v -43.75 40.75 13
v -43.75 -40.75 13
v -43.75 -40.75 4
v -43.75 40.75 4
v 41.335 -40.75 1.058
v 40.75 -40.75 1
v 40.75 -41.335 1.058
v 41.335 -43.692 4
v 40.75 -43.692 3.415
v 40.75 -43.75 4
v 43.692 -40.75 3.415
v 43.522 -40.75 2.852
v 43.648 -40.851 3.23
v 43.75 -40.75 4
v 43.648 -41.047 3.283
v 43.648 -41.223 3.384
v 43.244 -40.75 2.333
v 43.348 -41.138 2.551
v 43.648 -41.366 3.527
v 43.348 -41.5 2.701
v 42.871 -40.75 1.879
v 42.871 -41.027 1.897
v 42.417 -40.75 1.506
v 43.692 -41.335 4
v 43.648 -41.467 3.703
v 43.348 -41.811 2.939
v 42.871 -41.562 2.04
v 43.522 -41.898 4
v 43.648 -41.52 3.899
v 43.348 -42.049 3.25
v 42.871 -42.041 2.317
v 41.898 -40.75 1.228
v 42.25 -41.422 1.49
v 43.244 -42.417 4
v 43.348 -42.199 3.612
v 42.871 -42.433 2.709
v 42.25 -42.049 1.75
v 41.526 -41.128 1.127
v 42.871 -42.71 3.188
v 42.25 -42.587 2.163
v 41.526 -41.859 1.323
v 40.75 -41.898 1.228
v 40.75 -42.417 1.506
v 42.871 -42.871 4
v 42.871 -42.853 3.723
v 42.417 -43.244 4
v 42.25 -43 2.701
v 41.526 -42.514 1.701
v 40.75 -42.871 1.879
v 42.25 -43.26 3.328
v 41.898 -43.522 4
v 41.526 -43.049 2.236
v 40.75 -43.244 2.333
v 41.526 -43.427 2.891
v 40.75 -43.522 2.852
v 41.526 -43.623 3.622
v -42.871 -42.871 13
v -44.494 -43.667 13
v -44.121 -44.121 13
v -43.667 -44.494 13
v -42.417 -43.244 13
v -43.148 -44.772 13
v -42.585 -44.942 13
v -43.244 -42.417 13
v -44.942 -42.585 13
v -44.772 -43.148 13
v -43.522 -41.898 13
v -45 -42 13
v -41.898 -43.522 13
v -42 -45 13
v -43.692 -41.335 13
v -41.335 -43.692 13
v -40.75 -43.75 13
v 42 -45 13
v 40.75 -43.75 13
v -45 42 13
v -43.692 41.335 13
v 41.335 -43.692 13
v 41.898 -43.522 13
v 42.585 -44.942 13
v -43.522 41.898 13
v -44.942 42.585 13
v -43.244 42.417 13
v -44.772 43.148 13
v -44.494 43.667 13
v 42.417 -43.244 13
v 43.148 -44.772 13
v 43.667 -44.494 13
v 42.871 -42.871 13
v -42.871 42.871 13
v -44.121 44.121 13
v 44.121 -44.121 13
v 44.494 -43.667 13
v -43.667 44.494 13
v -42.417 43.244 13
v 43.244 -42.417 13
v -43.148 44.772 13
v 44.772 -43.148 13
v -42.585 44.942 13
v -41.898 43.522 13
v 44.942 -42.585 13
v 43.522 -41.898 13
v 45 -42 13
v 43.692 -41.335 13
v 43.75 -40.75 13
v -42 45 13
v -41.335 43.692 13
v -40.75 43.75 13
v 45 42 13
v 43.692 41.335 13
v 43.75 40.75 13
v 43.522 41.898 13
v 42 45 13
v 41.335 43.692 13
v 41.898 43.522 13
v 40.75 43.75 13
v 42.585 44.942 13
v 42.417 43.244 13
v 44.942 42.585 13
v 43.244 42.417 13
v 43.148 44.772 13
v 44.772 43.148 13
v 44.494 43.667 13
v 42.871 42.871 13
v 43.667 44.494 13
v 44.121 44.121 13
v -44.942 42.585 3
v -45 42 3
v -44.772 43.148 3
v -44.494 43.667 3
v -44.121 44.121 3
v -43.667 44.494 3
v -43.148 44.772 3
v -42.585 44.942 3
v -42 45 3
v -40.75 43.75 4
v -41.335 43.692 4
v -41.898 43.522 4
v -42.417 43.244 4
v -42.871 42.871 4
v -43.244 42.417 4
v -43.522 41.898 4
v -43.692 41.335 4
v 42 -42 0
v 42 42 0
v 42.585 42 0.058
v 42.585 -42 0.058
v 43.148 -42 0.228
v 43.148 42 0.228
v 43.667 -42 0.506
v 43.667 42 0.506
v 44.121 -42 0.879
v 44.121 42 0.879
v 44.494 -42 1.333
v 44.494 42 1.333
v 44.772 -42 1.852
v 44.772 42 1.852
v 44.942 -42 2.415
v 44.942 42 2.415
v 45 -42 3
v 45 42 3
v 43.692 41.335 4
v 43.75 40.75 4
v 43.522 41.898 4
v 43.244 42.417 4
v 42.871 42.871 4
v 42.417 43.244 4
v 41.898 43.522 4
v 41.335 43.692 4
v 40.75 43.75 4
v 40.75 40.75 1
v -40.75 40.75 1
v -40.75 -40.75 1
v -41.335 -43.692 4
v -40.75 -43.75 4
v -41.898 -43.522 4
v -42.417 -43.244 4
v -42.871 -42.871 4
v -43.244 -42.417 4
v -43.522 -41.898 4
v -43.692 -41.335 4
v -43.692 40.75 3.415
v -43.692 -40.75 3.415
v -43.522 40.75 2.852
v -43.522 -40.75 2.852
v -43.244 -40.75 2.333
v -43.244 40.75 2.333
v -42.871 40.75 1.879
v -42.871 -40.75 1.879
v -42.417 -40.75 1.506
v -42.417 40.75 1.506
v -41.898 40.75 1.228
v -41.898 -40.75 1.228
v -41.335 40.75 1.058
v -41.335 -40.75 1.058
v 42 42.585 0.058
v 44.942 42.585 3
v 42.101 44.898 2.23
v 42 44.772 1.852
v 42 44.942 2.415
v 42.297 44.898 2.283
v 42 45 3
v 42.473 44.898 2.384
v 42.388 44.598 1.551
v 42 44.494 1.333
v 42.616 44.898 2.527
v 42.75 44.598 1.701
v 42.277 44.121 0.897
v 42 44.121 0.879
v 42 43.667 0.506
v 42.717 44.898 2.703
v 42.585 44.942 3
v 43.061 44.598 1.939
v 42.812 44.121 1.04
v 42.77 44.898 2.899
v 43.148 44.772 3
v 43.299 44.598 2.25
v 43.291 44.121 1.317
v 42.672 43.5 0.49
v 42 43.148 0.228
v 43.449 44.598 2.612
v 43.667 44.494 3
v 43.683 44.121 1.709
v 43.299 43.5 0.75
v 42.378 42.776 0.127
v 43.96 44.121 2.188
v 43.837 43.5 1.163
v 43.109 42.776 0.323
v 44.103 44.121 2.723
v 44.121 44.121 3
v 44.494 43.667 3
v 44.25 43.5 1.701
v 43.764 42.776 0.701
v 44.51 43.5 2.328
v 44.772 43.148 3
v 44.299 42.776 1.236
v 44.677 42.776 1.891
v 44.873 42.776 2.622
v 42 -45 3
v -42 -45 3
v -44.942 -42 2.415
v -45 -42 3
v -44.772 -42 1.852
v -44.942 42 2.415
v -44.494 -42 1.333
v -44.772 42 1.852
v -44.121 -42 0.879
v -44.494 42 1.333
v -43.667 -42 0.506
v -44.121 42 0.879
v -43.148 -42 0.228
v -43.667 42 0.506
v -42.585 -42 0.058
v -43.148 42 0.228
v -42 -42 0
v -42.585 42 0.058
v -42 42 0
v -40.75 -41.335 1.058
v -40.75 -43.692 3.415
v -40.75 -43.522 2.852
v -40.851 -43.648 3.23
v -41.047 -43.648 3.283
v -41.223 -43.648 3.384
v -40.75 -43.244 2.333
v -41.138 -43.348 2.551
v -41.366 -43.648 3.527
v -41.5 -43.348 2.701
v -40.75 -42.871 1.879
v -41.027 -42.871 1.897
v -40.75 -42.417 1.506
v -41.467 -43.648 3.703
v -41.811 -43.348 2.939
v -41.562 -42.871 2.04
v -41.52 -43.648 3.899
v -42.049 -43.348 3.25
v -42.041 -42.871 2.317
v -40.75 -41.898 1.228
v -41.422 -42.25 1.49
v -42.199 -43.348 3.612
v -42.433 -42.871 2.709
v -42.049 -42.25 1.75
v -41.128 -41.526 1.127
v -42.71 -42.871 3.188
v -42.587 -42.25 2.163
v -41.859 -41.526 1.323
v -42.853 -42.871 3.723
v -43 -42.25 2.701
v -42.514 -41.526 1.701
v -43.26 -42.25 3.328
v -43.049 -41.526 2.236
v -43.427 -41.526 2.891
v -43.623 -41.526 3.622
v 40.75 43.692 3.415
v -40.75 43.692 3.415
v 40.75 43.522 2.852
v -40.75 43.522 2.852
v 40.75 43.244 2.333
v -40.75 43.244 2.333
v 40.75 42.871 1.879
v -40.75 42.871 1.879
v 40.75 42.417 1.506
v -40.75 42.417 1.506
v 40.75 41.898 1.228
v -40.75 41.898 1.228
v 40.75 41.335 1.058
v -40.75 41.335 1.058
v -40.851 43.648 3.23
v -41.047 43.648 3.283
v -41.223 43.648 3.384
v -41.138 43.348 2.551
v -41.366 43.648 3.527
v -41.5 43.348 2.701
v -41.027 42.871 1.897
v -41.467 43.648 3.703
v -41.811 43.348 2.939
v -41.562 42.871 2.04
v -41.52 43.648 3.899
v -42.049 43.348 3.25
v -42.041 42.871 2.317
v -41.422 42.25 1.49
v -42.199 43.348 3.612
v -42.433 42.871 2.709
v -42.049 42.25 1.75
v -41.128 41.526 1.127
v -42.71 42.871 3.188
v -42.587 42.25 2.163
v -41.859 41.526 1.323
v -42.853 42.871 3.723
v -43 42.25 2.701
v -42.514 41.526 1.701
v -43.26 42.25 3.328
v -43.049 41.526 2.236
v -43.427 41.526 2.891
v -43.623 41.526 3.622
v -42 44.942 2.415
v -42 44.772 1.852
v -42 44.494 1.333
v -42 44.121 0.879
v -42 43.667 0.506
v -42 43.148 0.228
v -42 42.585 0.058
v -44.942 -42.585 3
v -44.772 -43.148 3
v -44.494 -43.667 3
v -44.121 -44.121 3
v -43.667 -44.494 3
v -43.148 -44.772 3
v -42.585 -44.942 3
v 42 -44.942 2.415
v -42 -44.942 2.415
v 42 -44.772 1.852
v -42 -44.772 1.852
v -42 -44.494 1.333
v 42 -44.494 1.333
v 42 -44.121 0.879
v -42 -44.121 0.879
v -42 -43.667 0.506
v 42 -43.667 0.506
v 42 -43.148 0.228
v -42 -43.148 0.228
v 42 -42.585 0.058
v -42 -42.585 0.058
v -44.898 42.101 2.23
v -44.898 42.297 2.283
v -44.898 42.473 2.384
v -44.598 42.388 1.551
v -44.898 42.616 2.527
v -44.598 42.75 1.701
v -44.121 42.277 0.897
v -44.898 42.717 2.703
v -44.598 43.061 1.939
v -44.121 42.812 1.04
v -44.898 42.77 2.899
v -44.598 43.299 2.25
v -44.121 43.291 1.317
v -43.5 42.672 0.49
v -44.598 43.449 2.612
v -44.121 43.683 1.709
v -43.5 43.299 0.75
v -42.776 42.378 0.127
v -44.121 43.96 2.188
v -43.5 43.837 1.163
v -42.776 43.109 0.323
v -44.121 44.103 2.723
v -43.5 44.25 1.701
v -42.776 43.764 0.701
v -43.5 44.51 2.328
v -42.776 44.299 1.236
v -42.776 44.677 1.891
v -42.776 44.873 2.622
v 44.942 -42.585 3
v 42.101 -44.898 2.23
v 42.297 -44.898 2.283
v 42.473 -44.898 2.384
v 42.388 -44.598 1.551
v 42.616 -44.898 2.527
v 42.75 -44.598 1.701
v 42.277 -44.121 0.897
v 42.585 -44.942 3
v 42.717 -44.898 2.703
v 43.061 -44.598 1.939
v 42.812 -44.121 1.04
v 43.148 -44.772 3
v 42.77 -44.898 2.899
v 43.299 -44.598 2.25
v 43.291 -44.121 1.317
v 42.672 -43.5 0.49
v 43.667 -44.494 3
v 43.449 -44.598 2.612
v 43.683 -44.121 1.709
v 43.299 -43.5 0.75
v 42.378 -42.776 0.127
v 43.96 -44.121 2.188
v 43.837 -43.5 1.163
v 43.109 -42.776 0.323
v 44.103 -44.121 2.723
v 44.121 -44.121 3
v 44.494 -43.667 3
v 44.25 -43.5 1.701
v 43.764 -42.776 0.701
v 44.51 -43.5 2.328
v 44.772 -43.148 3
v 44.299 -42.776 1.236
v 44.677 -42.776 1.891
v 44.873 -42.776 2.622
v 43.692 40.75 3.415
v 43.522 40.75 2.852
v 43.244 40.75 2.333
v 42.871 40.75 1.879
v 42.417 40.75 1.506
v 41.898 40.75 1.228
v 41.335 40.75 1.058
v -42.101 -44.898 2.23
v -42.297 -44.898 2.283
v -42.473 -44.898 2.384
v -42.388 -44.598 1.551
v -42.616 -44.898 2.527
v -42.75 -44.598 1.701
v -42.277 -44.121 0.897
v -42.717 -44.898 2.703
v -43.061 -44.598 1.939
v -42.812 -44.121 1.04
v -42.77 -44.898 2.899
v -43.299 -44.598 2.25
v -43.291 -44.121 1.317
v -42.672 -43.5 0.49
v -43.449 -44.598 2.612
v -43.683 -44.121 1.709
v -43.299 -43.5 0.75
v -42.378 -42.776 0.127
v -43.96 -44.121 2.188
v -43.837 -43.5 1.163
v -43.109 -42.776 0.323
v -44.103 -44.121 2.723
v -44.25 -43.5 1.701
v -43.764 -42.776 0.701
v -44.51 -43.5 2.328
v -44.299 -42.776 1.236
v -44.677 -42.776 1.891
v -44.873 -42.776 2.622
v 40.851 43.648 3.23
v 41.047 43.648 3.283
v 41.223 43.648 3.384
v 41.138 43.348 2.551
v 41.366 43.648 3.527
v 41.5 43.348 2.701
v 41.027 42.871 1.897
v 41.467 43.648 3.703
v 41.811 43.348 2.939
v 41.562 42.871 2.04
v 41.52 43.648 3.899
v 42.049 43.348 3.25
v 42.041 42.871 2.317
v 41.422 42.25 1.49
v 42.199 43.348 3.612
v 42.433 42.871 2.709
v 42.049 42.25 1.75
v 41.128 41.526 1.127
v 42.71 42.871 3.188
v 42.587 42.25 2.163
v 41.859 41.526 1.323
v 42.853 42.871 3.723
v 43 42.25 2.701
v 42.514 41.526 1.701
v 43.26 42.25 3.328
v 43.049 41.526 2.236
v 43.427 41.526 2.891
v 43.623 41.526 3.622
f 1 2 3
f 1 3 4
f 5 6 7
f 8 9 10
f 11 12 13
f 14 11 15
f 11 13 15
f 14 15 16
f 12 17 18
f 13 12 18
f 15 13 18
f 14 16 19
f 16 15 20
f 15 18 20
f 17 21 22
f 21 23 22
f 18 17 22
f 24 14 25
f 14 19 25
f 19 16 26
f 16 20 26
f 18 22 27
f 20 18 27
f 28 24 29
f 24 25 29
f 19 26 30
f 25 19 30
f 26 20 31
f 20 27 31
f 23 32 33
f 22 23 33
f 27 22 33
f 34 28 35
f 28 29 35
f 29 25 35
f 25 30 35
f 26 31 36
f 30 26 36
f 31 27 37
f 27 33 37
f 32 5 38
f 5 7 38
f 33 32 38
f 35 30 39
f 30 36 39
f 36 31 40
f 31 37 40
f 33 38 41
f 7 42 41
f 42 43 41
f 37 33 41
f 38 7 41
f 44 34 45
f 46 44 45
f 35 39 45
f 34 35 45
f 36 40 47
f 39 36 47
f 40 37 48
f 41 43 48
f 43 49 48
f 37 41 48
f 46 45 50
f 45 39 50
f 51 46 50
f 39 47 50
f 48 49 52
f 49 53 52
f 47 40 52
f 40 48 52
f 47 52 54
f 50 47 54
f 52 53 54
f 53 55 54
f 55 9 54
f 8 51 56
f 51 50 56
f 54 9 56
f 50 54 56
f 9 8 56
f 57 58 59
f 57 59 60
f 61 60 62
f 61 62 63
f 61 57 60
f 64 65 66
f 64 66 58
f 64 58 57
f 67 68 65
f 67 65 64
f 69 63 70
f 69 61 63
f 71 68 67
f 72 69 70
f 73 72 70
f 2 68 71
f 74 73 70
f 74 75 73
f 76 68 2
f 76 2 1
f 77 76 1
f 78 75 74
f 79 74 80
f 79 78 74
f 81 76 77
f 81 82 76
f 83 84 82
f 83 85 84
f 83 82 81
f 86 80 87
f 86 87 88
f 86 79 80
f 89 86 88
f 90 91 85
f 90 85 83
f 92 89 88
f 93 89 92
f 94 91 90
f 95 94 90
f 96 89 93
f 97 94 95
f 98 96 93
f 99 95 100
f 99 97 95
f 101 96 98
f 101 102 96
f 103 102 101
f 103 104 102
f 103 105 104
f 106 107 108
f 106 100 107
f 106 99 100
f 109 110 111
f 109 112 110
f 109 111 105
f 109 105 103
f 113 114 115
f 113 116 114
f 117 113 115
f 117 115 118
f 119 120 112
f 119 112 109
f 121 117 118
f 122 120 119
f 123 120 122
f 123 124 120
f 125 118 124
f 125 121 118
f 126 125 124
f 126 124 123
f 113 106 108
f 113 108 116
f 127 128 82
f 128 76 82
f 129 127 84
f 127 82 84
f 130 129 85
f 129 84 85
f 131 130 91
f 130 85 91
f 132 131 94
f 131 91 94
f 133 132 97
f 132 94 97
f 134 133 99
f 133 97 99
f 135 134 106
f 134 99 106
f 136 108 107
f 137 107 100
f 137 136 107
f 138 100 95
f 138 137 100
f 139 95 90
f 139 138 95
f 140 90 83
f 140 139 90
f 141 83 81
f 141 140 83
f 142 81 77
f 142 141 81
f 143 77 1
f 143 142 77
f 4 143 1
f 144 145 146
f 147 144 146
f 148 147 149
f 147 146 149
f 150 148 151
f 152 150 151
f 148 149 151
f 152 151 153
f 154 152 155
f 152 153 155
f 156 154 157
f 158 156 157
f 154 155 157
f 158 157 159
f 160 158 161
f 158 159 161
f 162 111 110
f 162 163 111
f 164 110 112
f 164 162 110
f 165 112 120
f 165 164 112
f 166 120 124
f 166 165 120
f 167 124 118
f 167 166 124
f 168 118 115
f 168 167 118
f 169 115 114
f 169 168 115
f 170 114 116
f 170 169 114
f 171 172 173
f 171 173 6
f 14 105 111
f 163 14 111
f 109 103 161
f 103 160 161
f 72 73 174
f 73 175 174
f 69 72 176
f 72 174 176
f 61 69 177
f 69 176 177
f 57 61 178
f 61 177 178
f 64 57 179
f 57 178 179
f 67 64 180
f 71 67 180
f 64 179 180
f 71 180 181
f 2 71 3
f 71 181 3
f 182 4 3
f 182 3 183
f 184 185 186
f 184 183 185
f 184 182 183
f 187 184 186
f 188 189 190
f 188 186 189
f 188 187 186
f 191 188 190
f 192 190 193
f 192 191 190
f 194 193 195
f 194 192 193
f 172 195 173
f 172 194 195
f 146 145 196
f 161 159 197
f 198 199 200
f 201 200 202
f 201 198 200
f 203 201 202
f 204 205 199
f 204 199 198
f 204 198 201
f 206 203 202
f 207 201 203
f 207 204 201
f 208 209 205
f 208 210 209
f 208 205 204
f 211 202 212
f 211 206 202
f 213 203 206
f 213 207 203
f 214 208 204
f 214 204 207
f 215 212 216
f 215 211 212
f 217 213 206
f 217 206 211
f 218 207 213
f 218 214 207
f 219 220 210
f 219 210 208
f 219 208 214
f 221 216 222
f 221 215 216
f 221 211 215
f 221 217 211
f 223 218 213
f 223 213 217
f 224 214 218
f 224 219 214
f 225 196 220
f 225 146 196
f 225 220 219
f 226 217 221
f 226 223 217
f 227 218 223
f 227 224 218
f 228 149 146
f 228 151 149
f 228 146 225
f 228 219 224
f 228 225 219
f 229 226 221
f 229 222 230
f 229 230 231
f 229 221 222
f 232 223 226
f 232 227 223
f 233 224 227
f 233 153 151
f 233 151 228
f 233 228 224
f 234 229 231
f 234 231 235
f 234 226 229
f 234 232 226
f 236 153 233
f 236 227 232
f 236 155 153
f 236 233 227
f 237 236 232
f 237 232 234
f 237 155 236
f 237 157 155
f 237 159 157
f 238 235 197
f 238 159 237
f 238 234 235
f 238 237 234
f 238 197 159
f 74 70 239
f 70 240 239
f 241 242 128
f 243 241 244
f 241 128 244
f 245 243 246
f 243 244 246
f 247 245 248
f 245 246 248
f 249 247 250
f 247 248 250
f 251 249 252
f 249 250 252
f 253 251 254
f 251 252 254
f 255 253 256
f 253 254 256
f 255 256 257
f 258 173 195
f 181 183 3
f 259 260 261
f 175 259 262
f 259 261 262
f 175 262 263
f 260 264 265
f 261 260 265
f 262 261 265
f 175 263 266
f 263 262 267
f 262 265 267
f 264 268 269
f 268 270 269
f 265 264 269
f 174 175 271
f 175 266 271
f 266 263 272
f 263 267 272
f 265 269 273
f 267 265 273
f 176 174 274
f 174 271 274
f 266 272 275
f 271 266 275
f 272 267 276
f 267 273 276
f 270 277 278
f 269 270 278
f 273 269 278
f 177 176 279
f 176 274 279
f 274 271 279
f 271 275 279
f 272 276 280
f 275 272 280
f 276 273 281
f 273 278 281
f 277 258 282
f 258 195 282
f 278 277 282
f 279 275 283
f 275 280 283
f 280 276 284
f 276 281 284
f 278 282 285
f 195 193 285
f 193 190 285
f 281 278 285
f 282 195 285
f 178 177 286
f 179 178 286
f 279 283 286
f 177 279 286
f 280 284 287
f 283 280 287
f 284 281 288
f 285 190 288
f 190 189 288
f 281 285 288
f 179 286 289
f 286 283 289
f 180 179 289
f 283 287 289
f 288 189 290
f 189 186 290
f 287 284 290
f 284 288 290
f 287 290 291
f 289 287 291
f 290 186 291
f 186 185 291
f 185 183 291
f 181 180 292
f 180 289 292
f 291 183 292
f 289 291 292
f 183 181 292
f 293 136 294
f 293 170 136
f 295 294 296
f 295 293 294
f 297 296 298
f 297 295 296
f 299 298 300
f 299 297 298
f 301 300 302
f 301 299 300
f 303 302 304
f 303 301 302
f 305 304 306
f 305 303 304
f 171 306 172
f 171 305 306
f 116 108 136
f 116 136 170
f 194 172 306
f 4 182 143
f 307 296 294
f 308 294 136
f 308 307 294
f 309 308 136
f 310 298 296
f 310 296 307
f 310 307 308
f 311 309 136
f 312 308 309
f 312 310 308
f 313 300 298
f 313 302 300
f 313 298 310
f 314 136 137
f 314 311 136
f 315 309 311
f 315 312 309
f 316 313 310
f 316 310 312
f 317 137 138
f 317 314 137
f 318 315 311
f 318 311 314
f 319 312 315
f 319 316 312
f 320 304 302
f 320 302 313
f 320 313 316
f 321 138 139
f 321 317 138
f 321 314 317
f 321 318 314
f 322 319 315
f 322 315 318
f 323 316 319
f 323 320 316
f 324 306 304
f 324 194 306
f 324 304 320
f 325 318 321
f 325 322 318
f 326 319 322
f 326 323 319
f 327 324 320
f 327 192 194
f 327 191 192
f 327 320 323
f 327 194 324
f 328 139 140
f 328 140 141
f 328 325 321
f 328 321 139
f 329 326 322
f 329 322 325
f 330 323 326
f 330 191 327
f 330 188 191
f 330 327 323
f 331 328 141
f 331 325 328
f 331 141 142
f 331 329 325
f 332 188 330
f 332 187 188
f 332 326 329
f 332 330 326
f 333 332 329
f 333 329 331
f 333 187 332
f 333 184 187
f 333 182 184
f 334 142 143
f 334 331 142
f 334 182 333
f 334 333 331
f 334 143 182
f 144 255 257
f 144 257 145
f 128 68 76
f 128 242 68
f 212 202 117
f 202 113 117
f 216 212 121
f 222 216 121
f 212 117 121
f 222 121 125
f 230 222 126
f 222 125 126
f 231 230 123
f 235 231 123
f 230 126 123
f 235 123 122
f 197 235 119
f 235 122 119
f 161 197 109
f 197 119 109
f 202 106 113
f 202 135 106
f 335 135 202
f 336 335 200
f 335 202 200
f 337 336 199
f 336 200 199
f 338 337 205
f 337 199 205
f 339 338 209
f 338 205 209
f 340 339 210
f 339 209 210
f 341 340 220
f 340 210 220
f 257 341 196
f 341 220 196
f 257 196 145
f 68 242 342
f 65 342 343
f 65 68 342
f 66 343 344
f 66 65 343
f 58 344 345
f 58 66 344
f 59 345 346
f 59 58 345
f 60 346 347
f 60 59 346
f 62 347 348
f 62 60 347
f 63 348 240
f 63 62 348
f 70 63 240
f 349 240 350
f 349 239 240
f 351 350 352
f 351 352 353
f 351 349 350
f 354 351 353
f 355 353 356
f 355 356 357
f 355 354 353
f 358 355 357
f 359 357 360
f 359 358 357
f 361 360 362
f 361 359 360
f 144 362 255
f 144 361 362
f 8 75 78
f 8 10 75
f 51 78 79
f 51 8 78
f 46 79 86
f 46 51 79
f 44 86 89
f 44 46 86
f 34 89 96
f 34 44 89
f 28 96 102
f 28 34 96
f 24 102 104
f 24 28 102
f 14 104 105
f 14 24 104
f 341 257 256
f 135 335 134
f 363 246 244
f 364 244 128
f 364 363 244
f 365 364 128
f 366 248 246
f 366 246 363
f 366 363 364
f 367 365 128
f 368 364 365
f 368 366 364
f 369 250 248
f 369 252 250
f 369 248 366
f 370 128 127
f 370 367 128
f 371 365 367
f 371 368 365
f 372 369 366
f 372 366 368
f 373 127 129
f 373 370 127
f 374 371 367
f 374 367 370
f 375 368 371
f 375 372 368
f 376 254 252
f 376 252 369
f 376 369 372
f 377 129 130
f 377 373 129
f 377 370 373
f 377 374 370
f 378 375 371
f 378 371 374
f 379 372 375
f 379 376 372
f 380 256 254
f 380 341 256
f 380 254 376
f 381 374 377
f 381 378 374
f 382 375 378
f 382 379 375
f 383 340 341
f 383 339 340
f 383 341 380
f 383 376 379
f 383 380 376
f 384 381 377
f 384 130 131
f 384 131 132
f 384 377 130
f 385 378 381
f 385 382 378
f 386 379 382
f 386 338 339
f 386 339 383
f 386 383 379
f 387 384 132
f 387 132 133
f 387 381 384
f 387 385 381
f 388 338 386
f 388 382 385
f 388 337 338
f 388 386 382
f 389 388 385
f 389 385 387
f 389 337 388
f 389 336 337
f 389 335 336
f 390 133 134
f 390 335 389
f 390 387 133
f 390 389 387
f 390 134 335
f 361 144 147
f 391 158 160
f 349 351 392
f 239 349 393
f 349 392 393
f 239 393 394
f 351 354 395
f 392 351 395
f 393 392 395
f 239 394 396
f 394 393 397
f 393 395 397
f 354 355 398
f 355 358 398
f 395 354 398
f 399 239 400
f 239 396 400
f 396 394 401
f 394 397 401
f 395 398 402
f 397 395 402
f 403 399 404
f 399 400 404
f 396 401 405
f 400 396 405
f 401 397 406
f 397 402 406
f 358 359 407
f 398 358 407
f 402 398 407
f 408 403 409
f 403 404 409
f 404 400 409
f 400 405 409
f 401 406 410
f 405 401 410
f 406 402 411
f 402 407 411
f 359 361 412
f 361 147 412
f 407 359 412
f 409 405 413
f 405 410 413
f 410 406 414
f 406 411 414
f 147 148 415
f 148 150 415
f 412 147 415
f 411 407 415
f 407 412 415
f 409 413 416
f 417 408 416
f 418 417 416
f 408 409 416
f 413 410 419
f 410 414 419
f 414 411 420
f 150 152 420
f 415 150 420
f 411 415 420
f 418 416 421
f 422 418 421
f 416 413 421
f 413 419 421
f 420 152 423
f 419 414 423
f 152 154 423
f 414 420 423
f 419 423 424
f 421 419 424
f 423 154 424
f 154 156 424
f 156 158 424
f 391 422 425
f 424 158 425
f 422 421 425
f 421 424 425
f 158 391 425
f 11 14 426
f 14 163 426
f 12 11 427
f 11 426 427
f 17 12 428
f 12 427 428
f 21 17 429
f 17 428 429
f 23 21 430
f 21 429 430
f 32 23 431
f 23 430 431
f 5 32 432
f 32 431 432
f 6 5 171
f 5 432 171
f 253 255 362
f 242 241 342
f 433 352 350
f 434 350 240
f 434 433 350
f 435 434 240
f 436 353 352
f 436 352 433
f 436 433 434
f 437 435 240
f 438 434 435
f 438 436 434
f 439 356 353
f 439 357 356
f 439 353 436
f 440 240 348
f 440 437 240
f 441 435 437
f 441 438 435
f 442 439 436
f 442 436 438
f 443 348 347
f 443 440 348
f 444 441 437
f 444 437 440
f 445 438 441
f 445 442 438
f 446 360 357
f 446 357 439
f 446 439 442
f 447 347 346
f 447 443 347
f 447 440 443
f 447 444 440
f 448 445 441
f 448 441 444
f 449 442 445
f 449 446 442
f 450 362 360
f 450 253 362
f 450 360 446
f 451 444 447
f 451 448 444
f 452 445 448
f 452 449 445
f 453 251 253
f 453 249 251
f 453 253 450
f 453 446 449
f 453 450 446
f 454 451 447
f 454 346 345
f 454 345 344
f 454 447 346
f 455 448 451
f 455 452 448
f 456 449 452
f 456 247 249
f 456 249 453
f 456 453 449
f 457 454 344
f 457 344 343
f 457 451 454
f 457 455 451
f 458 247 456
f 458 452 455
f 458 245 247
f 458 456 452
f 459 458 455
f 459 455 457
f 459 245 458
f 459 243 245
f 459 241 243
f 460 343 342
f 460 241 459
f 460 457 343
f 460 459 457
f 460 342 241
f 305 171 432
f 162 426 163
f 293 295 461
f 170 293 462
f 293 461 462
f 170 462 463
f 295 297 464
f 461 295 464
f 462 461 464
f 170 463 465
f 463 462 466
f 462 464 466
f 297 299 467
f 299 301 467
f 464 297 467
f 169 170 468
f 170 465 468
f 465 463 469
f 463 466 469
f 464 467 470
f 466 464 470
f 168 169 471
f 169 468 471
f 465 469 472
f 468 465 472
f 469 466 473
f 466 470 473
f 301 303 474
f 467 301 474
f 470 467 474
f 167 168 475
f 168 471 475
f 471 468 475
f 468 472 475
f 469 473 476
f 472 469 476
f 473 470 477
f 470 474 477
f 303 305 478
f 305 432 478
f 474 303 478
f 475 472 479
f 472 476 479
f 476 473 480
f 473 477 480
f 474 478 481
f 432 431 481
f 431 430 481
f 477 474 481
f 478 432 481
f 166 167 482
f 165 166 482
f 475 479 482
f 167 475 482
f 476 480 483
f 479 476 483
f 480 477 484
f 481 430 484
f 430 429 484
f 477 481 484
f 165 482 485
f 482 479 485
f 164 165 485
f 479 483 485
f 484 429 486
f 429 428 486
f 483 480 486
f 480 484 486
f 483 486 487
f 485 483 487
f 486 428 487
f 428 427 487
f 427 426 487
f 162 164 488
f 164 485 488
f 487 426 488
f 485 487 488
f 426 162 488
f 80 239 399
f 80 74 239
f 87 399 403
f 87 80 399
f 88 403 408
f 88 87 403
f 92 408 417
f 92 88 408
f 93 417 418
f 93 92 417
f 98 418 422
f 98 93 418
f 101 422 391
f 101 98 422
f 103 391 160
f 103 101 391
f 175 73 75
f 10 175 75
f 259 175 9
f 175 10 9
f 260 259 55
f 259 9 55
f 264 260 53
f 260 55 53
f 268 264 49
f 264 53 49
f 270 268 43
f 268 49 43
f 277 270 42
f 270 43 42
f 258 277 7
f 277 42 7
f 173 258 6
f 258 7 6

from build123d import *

# Parameters (mm, degrees)
F0_W     = 90
F0_H     = 90
F1_DEPTH = 13
F2_W     = 87.5
F2_H     = 87.5
F3_DEPTH = 12
F4_R     = 3


with BuildPart() as f1:
    # F0 (on Top) → F1 (new body)
    with BuildSketch(Plane.XY):
        Rectangle(F0_W, F0_H)
    extrude(amount=F1_DEPTH)

    # F2 (on face) → F3 (cut)
    with BuildSketch(Plane.XY.offset(13)):
        Rectangle(F2_W, F2_H)
    extrude(amount=-F3_DEPTH, mode=Mode.SUBTRACT)

    # F4
    f4_edges = [f1.edges().sort_by_distance(p)[0] for p in [
        (45, 0, 0),
        (0, 45, 0),
        (-45, 0, 0),
        (0, -45, 0),
        (45, -45, 6.5),
        (45, 45, 6.5),
        (-45, -45, 6.5),
        (-45, 45, 6.5),
        (-43.75, 0, 1),
        (0, -43.75, 1),
        (43.75, 0, 1),
        (0, 43.75, 1),
        (-43.75, 43.75, 7),
        (43.75, 43.75, 7),
        (43.75, -43.75, 7),
        (-43.75, -43.75, 7),
    ]]
    fillet(f4_edges, radius=F4_R)


solid = f1.part
